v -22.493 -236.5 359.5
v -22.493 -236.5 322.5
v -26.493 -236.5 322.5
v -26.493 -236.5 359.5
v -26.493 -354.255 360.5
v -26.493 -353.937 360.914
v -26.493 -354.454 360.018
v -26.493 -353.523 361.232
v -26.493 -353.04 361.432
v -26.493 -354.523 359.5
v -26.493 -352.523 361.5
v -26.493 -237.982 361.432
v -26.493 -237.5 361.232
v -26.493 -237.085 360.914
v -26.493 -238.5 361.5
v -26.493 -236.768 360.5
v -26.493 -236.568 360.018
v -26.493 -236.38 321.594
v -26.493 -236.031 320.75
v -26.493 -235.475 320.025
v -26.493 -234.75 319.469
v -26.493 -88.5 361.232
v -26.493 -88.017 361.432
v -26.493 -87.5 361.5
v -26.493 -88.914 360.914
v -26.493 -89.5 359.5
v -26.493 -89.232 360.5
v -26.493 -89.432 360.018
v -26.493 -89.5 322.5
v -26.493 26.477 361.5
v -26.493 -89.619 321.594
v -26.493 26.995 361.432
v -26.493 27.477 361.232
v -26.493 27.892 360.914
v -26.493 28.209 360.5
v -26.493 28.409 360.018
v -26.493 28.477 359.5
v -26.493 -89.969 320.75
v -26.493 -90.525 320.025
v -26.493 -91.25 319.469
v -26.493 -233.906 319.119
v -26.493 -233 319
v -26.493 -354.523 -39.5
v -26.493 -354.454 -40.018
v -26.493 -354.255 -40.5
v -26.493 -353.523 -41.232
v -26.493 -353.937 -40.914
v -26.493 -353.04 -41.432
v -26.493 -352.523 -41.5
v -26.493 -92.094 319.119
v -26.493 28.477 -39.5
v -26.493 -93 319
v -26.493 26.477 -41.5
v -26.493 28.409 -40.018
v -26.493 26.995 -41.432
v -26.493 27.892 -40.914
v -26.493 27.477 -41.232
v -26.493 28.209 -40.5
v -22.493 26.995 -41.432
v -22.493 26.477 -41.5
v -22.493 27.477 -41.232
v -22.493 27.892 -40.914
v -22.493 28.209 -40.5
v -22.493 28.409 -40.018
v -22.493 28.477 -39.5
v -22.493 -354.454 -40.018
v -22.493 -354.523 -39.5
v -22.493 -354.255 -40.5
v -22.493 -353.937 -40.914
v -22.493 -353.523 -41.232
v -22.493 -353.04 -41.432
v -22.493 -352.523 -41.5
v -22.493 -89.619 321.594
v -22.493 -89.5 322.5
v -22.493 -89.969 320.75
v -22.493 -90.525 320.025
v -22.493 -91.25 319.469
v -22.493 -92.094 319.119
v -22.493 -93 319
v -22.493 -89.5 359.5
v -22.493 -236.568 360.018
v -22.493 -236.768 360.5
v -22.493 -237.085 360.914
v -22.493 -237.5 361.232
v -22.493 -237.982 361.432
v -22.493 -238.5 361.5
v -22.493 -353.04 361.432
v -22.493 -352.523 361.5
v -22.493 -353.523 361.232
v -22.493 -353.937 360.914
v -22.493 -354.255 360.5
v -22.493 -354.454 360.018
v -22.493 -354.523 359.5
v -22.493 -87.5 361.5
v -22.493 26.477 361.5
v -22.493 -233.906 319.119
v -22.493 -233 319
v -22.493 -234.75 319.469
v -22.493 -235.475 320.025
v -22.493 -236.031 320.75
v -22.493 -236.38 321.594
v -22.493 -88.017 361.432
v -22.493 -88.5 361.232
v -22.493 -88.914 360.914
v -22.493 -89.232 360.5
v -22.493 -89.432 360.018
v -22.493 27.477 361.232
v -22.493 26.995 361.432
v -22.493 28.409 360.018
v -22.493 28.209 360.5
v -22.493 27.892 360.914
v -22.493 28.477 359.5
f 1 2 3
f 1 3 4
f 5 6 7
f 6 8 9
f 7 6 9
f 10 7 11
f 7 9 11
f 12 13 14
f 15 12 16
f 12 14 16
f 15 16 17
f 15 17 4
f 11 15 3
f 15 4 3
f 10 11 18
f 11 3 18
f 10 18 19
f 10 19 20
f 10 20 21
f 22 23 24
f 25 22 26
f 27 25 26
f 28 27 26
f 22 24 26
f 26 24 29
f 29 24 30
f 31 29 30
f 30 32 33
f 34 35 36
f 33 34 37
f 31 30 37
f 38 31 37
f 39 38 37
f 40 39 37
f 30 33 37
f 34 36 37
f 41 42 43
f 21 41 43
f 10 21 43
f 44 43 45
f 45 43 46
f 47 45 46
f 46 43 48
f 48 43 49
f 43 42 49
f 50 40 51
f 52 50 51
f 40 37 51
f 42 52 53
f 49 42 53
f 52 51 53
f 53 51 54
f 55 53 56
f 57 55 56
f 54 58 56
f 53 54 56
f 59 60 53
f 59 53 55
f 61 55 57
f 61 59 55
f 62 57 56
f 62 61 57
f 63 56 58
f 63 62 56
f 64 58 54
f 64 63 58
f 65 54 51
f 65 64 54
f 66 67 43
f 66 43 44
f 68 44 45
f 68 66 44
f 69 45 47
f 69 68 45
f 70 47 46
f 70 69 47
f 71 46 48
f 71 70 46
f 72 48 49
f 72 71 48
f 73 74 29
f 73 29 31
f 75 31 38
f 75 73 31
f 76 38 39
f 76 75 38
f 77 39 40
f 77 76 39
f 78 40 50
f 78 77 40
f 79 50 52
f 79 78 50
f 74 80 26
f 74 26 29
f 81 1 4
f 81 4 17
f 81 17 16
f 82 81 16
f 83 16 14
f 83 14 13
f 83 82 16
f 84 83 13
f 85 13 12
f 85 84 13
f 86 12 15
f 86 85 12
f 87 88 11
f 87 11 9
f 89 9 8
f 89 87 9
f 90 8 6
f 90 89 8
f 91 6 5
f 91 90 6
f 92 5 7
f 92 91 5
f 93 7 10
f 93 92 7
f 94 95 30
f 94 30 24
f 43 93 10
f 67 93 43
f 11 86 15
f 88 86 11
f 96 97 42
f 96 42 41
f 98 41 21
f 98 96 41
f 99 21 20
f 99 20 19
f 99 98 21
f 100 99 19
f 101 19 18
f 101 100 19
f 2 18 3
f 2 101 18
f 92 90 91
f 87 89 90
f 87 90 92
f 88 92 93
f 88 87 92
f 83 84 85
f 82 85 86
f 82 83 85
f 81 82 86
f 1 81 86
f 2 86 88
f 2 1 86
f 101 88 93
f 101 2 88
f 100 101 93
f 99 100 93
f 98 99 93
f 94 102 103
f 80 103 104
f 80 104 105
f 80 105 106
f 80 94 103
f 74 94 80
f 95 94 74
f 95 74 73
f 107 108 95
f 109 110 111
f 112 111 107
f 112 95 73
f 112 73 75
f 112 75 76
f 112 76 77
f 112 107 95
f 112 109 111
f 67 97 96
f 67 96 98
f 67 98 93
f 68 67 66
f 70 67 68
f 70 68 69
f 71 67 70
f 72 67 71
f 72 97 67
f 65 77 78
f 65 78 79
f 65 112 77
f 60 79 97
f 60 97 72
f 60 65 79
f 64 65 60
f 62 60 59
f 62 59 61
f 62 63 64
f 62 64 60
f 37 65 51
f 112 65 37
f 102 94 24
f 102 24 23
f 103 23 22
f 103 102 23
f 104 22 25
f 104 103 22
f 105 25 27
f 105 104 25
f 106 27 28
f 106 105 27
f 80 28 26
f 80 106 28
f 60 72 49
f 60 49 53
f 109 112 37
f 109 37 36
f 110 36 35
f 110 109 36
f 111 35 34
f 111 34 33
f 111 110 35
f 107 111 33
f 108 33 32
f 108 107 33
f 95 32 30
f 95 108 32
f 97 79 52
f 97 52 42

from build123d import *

# Parameters (mm, degrees)
BOSS_EXTRUDE1_DEPTH = 4


with BuildPart() as part:
    # Sketch1 → Boss-Extrude1 (new body)
    with BuildSketch(Plane(origin=(-22.493180964, 0, 0), x_dir=(0, 0, -1), z_dir=(1, 0, 0))):
        with BuildLine():
            Line((41.499999434, -352.52261402), (41.499999434, 26.477385891))
            ThreePointArc((41.499999434, 26.477385891), (40.914212996, 27.891599453), (39.499999434, 28.477385891))
            Line((39.499999434, 28.477385891), (-359.500000477, 28.477385891))
            ThreePointArc((-359.500000477, 28.477385891), (-360.914214039, 27.891599453), (-361.500000477, 26.477385891))
            Line((-361.500000477, 26.477385891), (-361.500000477, -87.499667694))
            ThreePointArc((-361.500000477, -87.499667694), (-360.914214039, -88.913881256), (-359.500000477, -89.499667694))
            Line((-359.500000477, -89.499667694), (-322.5, -89.499667694))
            ThreePointArc((-322.5, -89.499667694), (-320.025126266, -90.524793959), (-319, -92.999667694))
            Line((-319, -92.999667694), (-319, -232.999667694))
            ThreePointArc((-319, -232.999667694), (-320.025126266, -235.474541428), (-322.5, -236.499667694))
            Line((-322.5, -236.499667694), (-359.500000477, -236.499667694))
            ThreePointArc((-359.500000477, -236.499667694), (-360.914214039, -237.085454131), (-361.500000477, -238.499667694))
            Line((-361.500000477, -238.499667694), (-361.500000477, -352.52261402))
            ThreePointArc((-361.500000477, -352.52261402), (-360.914214039, -353.936827582), (-359.500000477, -354.52261402))
            Line((-359.500000477, -354.52261402), (39.499999434, -354.52261402))
            ThreePointArc((39.499999434, -354.52261402), (40.914212996, -353.936827582), (41.499999434, -352.52261402))
        make_face()
    extrude(amount=-BOSS_EXTRUDE1_DEPTH)


solid = part.part
